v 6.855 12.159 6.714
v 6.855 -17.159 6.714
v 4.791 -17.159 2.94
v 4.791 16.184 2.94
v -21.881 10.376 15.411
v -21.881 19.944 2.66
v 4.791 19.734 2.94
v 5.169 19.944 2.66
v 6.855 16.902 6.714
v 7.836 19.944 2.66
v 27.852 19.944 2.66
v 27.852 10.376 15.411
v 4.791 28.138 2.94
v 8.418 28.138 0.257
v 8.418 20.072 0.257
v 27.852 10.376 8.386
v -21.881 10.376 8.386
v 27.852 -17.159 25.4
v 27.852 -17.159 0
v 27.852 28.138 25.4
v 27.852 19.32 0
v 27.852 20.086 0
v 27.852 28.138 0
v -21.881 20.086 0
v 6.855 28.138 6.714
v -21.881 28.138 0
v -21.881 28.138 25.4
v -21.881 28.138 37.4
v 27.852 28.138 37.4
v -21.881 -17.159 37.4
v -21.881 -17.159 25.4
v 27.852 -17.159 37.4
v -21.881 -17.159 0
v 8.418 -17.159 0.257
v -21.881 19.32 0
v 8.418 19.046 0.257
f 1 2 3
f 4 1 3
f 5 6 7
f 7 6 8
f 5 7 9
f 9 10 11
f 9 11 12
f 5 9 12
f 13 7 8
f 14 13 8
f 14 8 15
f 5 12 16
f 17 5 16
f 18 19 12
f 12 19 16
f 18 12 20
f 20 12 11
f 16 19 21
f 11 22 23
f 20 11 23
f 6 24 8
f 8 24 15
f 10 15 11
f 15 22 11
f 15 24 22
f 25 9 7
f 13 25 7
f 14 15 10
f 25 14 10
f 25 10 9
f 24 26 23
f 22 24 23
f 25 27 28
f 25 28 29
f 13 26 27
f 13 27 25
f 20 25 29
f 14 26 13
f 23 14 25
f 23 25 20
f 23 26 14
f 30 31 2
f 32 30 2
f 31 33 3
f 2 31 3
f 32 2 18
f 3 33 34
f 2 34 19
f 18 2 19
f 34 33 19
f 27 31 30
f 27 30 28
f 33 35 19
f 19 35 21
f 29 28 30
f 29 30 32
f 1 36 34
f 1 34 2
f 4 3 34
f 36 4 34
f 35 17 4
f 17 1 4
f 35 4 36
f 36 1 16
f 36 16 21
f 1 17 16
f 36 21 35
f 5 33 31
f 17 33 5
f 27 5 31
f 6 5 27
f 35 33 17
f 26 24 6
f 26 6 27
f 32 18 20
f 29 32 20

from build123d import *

# Parameters (mm, degrees)
F0_W      = 49.733065
F0_H      = 45.29678
F1_DEPTH  = 25.4
F1_FACE_W = 49.733066
F1_FACE_H = 45.29678
F2_DEPTH  = 12
F5_DEPTH  = 49.734065
F7_DEPTH  = 45.297781


with BuildPart() as f1:
    # F0 (on Top) → F1 (new body)
    with BuildSketch(Plane.XY):
        with Locations((2.985905, 5.489435)):
            Rectangle(F0_W, F0_H)
    extrude(amount=F1_DEPTH)

    # F1_face (on face) → F2 (join)
    with BuildSketch(Plane(origin=(2.985906, 5.489435, 25.4), x_dir=(1, 0, 0), z_dir=(0, 0, 1))):
        Rectangle(F1_FACE_W, F1_FACE_H)
    extrude(amount=F2_DEPTH)

    # F4 (on face) → F5 (cut, through all)
    with BuildSketch(Plane.YZ.offset(27.852438)):
        Polygon((10.376193, 15.41099), (10.376193, 8.385699), (19.320368, 0), (20.085741, 0), (19.943943, 2.660368), align=None)
    extrude(amount=-F5_DEPTH, mode=Mode.SUBTRACT)

    # F6 (on face) → F7 (cut, through all)
    with BuildSketch(Plane.XZ.offset(17.158955)):
        Polygon((6.854975, 6.713986), (4.791144, 2.940124), (8.41759, 0.257144), align=None)
    extrude(amount=-F7_DEPTH, mode=Mode.SUBTRACT)


solid = f1.part
